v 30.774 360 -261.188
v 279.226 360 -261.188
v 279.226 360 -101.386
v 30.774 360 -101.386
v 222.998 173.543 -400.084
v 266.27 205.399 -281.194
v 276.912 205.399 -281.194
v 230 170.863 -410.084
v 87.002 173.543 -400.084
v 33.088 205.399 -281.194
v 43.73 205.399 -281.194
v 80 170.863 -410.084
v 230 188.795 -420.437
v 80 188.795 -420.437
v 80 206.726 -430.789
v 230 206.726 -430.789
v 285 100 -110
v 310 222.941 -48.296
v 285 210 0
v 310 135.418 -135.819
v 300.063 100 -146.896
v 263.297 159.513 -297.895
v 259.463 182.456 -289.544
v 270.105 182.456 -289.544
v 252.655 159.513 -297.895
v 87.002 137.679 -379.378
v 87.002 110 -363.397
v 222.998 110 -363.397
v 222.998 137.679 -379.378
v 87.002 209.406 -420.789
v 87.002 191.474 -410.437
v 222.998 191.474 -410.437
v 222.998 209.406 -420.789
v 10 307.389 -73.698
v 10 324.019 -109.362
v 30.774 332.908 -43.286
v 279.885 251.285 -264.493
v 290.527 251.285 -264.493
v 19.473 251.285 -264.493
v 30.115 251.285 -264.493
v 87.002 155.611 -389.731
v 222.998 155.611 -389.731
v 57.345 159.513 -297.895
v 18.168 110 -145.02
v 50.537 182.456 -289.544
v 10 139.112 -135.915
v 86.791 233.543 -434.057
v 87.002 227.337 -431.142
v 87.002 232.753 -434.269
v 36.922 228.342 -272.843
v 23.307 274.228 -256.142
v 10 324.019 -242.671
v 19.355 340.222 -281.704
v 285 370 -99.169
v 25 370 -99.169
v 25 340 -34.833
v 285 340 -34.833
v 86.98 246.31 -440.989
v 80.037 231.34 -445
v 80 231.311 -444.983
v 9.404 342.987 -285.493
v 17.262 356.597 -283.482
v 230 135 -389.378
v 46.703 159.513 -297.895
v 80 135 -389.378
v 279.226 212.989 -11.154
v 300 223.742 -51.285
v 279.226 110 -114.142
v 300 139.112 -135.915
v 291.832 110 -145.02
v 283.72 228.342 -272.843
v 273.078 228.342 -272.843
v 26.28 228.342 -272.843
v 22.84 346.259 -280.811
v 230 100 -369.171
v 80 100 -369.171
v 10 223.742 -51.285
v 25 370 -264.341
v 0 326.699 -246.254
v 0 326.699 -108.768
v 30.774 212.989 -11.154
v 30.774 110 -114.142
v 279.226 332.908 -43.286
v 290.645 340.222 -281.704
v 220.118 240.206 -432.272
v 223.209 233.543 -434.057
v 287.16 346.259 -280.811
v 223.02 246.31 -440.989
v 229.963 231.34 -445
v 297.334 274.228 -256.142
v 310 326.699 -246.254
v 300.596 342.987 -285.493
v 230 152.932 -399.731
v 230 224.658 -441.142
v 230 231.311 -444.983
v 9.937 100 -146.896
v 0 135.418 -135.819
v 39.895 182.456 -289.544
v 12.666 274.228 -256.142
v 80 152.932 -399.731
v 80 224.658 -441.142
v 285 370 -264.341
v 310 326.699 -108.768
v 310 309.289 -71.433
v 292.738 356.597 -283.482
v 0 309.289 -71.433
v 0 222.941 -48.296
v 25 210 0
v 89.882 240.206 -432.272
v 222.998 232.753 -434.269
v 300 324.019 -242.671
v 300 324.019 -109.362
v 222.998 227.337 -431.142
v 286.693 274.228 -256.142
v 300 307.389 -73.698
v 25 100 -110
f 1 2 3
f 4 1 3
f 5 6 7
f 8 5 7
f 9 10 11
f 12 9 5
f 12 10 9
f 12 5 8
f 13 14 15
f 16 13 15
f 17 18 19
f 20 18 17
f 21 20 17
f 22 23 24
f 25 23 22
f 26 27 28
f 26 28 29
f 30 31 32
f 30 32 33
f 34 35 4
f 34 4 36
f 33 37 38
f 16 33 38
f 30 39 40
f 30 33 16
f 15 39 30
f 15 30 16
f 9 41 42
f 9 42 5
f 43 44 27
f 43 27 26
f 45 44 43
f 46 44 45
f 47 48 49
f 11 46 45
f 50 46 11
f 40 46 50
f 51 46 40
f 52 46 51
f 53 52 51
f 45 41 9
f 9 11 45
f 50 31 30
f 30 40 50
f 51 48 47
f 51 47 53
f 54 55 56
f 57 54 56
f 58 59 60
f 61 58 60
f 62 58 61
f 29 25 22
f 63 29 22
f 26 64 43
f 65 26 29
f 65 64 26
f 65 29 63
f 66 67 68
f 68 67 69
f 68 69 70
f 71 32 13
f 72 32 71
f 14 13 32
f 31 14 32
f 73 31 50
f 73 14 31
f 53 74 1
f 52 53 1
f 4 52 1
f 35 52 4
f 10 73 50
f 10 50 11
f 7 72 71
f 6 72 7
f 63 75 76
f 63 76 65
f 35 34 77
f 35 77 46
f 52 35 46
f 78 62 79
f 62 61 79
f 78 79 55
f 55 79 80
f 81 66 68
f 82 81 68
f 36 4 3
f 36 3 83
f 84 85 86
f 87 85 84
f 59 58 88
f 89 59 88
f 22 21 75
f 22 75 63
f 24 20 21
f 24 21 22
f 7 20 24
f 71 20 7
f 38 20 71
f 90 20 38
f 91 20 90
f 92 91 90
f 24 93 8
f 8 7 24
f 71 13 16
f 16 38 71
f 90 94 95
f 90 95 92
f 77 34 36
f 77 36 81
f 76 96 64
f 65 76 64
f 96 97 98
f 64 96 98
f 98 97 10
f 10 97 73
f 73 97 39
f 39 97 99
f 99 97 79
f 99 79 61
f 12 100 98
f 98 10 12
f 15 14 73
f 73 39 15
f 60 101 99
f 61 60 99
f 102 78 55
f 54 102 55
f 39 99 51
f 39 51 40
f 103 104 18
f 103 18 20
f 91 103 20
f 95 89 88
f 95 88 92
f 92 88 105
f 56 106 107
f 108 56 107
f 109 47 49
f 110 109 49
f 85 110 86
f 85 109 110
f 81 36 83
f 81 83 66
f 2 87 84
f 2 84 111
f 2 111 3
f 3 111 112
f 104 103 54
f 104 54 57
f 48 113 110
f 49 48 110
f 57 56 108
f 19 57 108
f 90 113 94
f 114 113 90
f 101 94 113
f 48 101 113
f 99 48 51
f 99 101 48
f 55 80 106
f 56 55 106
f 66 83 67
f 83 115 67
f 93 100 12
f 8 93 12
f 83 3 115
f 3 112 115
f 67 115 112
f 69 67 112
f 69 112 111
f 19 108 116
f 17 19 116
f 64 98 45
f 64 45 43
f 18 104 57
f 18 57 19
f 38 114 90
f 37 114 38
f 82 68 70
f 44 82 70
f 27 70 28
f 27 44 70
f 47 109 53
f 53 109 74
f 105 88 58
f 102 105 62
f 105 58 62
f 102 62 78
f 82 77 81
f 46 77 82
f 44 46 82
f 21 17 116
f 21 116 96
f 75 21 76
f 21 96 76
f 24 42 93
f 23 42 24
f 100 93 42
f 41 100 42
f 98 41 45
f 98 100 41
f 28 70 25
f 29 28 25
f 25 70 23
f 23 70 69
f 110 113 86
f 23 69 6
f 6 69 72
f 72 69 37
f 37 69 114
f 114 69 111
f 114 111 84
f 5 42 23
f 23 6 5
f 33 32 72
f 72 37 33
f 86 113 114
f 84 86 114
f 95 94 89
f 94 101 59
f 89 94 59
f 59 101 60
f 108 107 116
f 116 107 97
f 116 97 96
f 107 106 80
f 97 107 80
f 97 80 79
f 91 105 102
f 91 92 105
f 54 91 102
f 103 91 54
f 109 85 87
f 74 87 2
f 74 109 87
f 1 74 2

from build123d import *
from OCP.BRepFilletAPI import BRepFilletAPI_MakeChamfer

# Parameters (mm, degrees)
BOSS_EXTRU_1_DEPTH      = 310
CHANFREIN1_SIZE         = 80
CHANFREIN1_SIZE2        = 219.798193556
CHANFREIN2_SIZE         = 25
CHANFREIN2_SIZE2        = 43.301270189
CHANFREIN3_SIZE         = 10
CHANFREIN3_SIZE2        = 11.000628676
CHANFREIN3_SIZE2_2      = 10.311972297
COQUE1_T                = 10
ENL_V_MAT_EXTRU_1_DEPTH = 657.524942405


with BuildPart() as part:
    # Esquisse1 → Boss.-Extru.1 (new body)
    with BuildSketch(Plane(origin=(0, 0, 0), x_dir=(0, 0, -1), z_dir=(1, 0, 0))):
        Polygon((369.170962313, 100), (450, 240), (264.340759124, 370), (99.168602631, 370), (34.833395016, 340), (0, 210), (110, 100), align=None)
    extrude(amount=BOSS_EXTRU_1_DEPTH)

    # Chanfrein1
    chanfrein1_edges = [part.edges().sort_by_distance(p)[0] for p in [
        (310, 170, -409.585481157),
        (0, 170, -409.585481157),
    ]]
    chanfrein1_side = [part.faces().sort_by_distance(p)[0] for p in [
        (155, 170, -409.585481157),
    ]]
    chamfer(chanfrein1_edges, length=CHANFREIN1_SIZE, length2=CHANFREIN1_SIZE2, reference=chanfrein1_side[0])

    # Chanfrein2: one chamfer whose edges measure the first distance from different faces: ONE call of the kernel's chamfer builder (chamfer() names one face for all edges)
    chanfrein2_edges_1 = [part.edges().sort_by_distance(p)[0] for p in [
        (0, 155, -55),
        (310, 155, -55),
    ]]
    chanfrein2_side_1 = [part.faces().sort_by_distance(p)[0] for p in [
        (155, 155, -55),
    ]]
    chanfrein2_edges_2 = [part.edges().sort_by_distance(p)[0] for p in [
        (0, 275, -17.416697508),
        (310, 275, -17.416697508),
    ]]
    chanfrein2_side_2 = [part.faces().sort_by_distance(p)[0] for p in [
        (155, 275, -17.416697508),
    ]]
    chanfrein2_edges_3 = [part.edges().sort_by_distance(p)[0] for p in [
        (0, 355, -67.000998824),
        (310, 355, -67.000998824),
    ]]
    chanfrein2_side_3 = [part.faces().sort_by_distance(p)[0] for p in [
        (155, 355, -67.000998824),
    ]]
    chanfrein2_edges_4 = [part.edges().sort_by_distance(p)[0] for p in [
        (0, 370, -181.754680877),
        (310, 370, -181.754680877),
    ]]
    chanfrein2_side_4 = [part.faces().sort_by_distance(p)[0] for p in [
        (155, 370, -181.754680877),
    ]]
    chanfrein2 = BRepFilletAPI_MakeChamfer(part.part.solid().wrapped)
    for e in chanfrein2_edges_1:
        chanfrein2.Add(CHANFREIN2_SIZE, CHANFREIN2_SIZE2, e.wrapped, chanfrein2_side_1[0].wrapped)  # the first distance lies on this face
    for e in chanfrein2_edges_2:
        chanfrein2.Add(CHANFREIN2_SIZE, CHANFREIN2_SIZE2, e.wrapped, chanfrein2_side_2[0].wrapped)  # the first distance lies on this face
    for e in chanfrein2_edges_3:
        chanfrein2.Add(CHANFREIN2_SIZE, CHANFREIN2_SIZE2, e.wrapped, chanfrein2_side_3[0].wrapped)  # the first distance lies on this face
    for e in chanfrein2_edges_4:
        chanfrein2.Add(CHANFREIN2_SIZE, CHANFREIN2_SIZE2, e.wrapped, chanfrein2_side_4[0].wrapped)  # the first distance lies on this face
    add(Compound.cast(chanfrein2.Shape()), mode=Mode.REPLACE)

    # Chanfrein3: one chamfer whose edges measure the first distance from different faces: ONE call of the kernel's chamfer builder (chamfer() names one face for all edges)
    chanfrein3_edges_1 = [part.edges().sort_by_distance(p)[0] for p in [
        (155, 240, -450),
    ]]
    chanfrein3_side_1 = [part.faces().sort_by_distance(p)[0] for p in [
        (155, 170, -409.585481157),
    ]]
    chanfrein3_edges_2 = [part.edges().sort_by_distance(p)[0] for p in [
        (46.013035878, 293.764248554, -373.216695593),
    ]]
    chanfrein3_side_2 = [part.faces().sort_by_distance(p)[0] for p in [
        (36.692430522, 203.807514508, -291.710403206),
    ]]
    chanfrein3_edges_3 = [part.edges().sort_by_distance(p)[0] for p in [
        (263.986964122, 293.764248554, -373.216695593),
    ]]
    chanfrein3_side_3 = [part.faces().sort_by_distance(p)[0] for p in [
        (273.307569478, 203.807514508, -291.710403206),
    ]]
    chanfrein3 = BRepFilletAPI_MakeChamfer(part.part.solid().wrapped)
    for e in chanfrein3_edges_1:
        chanfrein3.Add(CHANFREIN3_SIZE, CHANFREIN3_SIZE2, e.wrapped, chanfrein3_side_1[0].wrapped)  # the first distance lies on this face
    for e in chanfrein3_edges_2:
        chanfrein3.Add(CHANFREIN3_SIZE, CHANFREIN3_SIZE2_2, e.wrapped, chanfrein3_side_2[0].wrapped)  # the first distance lies on this face
    for e in chanfrein3_edges_3:
        chanfrein3.Add(CHANFREIN3_SIZE, CHANFREIN3_SIZE2_2, e.wrapped, chanfrein3_side_3[0].wrapped)  # the first distance lies on this face
    add(Compound.cast(chanfrein3.Shape()), mode=Mode.REPLACE)

    # Coque1 (no face opened: a closed hollow body)
    add(offset(amount=-COQUE1_T, mode=Mode.PRIVATE), mode=Mode.SUBTRACT)

    # Esquisse2 → Enlèv. mat.-Extru.1 (cut, through all)
    with BuildSketch(Plane(origin=(0, 0, 0), x_dir=(0, 0, -1), z_dir=(1, 0, 0))):
        Polygon((441.142030756, 224.657547217), (256.142030756, 274.228147817), (264.492620752, 251.285090363), (430.789268951, 206.726037773), align=None)
        Polygon((297.894980737, 159.512860546), (389.378221735, 135), (399.730983539, 152.931509443), (289.544390741, 182.455918), align=None)
        Polygon((272.843210748, 228.342032908), (281.193800745, 205.398975454), (410.083745343, 170.863018887), (420.436507147, 188.79452833), align=None)
    extrude(amount=ENL_V_MAT_EXTRU_1_DEPTH, mode=Mode.SUBTRACT)


solid = part.part
